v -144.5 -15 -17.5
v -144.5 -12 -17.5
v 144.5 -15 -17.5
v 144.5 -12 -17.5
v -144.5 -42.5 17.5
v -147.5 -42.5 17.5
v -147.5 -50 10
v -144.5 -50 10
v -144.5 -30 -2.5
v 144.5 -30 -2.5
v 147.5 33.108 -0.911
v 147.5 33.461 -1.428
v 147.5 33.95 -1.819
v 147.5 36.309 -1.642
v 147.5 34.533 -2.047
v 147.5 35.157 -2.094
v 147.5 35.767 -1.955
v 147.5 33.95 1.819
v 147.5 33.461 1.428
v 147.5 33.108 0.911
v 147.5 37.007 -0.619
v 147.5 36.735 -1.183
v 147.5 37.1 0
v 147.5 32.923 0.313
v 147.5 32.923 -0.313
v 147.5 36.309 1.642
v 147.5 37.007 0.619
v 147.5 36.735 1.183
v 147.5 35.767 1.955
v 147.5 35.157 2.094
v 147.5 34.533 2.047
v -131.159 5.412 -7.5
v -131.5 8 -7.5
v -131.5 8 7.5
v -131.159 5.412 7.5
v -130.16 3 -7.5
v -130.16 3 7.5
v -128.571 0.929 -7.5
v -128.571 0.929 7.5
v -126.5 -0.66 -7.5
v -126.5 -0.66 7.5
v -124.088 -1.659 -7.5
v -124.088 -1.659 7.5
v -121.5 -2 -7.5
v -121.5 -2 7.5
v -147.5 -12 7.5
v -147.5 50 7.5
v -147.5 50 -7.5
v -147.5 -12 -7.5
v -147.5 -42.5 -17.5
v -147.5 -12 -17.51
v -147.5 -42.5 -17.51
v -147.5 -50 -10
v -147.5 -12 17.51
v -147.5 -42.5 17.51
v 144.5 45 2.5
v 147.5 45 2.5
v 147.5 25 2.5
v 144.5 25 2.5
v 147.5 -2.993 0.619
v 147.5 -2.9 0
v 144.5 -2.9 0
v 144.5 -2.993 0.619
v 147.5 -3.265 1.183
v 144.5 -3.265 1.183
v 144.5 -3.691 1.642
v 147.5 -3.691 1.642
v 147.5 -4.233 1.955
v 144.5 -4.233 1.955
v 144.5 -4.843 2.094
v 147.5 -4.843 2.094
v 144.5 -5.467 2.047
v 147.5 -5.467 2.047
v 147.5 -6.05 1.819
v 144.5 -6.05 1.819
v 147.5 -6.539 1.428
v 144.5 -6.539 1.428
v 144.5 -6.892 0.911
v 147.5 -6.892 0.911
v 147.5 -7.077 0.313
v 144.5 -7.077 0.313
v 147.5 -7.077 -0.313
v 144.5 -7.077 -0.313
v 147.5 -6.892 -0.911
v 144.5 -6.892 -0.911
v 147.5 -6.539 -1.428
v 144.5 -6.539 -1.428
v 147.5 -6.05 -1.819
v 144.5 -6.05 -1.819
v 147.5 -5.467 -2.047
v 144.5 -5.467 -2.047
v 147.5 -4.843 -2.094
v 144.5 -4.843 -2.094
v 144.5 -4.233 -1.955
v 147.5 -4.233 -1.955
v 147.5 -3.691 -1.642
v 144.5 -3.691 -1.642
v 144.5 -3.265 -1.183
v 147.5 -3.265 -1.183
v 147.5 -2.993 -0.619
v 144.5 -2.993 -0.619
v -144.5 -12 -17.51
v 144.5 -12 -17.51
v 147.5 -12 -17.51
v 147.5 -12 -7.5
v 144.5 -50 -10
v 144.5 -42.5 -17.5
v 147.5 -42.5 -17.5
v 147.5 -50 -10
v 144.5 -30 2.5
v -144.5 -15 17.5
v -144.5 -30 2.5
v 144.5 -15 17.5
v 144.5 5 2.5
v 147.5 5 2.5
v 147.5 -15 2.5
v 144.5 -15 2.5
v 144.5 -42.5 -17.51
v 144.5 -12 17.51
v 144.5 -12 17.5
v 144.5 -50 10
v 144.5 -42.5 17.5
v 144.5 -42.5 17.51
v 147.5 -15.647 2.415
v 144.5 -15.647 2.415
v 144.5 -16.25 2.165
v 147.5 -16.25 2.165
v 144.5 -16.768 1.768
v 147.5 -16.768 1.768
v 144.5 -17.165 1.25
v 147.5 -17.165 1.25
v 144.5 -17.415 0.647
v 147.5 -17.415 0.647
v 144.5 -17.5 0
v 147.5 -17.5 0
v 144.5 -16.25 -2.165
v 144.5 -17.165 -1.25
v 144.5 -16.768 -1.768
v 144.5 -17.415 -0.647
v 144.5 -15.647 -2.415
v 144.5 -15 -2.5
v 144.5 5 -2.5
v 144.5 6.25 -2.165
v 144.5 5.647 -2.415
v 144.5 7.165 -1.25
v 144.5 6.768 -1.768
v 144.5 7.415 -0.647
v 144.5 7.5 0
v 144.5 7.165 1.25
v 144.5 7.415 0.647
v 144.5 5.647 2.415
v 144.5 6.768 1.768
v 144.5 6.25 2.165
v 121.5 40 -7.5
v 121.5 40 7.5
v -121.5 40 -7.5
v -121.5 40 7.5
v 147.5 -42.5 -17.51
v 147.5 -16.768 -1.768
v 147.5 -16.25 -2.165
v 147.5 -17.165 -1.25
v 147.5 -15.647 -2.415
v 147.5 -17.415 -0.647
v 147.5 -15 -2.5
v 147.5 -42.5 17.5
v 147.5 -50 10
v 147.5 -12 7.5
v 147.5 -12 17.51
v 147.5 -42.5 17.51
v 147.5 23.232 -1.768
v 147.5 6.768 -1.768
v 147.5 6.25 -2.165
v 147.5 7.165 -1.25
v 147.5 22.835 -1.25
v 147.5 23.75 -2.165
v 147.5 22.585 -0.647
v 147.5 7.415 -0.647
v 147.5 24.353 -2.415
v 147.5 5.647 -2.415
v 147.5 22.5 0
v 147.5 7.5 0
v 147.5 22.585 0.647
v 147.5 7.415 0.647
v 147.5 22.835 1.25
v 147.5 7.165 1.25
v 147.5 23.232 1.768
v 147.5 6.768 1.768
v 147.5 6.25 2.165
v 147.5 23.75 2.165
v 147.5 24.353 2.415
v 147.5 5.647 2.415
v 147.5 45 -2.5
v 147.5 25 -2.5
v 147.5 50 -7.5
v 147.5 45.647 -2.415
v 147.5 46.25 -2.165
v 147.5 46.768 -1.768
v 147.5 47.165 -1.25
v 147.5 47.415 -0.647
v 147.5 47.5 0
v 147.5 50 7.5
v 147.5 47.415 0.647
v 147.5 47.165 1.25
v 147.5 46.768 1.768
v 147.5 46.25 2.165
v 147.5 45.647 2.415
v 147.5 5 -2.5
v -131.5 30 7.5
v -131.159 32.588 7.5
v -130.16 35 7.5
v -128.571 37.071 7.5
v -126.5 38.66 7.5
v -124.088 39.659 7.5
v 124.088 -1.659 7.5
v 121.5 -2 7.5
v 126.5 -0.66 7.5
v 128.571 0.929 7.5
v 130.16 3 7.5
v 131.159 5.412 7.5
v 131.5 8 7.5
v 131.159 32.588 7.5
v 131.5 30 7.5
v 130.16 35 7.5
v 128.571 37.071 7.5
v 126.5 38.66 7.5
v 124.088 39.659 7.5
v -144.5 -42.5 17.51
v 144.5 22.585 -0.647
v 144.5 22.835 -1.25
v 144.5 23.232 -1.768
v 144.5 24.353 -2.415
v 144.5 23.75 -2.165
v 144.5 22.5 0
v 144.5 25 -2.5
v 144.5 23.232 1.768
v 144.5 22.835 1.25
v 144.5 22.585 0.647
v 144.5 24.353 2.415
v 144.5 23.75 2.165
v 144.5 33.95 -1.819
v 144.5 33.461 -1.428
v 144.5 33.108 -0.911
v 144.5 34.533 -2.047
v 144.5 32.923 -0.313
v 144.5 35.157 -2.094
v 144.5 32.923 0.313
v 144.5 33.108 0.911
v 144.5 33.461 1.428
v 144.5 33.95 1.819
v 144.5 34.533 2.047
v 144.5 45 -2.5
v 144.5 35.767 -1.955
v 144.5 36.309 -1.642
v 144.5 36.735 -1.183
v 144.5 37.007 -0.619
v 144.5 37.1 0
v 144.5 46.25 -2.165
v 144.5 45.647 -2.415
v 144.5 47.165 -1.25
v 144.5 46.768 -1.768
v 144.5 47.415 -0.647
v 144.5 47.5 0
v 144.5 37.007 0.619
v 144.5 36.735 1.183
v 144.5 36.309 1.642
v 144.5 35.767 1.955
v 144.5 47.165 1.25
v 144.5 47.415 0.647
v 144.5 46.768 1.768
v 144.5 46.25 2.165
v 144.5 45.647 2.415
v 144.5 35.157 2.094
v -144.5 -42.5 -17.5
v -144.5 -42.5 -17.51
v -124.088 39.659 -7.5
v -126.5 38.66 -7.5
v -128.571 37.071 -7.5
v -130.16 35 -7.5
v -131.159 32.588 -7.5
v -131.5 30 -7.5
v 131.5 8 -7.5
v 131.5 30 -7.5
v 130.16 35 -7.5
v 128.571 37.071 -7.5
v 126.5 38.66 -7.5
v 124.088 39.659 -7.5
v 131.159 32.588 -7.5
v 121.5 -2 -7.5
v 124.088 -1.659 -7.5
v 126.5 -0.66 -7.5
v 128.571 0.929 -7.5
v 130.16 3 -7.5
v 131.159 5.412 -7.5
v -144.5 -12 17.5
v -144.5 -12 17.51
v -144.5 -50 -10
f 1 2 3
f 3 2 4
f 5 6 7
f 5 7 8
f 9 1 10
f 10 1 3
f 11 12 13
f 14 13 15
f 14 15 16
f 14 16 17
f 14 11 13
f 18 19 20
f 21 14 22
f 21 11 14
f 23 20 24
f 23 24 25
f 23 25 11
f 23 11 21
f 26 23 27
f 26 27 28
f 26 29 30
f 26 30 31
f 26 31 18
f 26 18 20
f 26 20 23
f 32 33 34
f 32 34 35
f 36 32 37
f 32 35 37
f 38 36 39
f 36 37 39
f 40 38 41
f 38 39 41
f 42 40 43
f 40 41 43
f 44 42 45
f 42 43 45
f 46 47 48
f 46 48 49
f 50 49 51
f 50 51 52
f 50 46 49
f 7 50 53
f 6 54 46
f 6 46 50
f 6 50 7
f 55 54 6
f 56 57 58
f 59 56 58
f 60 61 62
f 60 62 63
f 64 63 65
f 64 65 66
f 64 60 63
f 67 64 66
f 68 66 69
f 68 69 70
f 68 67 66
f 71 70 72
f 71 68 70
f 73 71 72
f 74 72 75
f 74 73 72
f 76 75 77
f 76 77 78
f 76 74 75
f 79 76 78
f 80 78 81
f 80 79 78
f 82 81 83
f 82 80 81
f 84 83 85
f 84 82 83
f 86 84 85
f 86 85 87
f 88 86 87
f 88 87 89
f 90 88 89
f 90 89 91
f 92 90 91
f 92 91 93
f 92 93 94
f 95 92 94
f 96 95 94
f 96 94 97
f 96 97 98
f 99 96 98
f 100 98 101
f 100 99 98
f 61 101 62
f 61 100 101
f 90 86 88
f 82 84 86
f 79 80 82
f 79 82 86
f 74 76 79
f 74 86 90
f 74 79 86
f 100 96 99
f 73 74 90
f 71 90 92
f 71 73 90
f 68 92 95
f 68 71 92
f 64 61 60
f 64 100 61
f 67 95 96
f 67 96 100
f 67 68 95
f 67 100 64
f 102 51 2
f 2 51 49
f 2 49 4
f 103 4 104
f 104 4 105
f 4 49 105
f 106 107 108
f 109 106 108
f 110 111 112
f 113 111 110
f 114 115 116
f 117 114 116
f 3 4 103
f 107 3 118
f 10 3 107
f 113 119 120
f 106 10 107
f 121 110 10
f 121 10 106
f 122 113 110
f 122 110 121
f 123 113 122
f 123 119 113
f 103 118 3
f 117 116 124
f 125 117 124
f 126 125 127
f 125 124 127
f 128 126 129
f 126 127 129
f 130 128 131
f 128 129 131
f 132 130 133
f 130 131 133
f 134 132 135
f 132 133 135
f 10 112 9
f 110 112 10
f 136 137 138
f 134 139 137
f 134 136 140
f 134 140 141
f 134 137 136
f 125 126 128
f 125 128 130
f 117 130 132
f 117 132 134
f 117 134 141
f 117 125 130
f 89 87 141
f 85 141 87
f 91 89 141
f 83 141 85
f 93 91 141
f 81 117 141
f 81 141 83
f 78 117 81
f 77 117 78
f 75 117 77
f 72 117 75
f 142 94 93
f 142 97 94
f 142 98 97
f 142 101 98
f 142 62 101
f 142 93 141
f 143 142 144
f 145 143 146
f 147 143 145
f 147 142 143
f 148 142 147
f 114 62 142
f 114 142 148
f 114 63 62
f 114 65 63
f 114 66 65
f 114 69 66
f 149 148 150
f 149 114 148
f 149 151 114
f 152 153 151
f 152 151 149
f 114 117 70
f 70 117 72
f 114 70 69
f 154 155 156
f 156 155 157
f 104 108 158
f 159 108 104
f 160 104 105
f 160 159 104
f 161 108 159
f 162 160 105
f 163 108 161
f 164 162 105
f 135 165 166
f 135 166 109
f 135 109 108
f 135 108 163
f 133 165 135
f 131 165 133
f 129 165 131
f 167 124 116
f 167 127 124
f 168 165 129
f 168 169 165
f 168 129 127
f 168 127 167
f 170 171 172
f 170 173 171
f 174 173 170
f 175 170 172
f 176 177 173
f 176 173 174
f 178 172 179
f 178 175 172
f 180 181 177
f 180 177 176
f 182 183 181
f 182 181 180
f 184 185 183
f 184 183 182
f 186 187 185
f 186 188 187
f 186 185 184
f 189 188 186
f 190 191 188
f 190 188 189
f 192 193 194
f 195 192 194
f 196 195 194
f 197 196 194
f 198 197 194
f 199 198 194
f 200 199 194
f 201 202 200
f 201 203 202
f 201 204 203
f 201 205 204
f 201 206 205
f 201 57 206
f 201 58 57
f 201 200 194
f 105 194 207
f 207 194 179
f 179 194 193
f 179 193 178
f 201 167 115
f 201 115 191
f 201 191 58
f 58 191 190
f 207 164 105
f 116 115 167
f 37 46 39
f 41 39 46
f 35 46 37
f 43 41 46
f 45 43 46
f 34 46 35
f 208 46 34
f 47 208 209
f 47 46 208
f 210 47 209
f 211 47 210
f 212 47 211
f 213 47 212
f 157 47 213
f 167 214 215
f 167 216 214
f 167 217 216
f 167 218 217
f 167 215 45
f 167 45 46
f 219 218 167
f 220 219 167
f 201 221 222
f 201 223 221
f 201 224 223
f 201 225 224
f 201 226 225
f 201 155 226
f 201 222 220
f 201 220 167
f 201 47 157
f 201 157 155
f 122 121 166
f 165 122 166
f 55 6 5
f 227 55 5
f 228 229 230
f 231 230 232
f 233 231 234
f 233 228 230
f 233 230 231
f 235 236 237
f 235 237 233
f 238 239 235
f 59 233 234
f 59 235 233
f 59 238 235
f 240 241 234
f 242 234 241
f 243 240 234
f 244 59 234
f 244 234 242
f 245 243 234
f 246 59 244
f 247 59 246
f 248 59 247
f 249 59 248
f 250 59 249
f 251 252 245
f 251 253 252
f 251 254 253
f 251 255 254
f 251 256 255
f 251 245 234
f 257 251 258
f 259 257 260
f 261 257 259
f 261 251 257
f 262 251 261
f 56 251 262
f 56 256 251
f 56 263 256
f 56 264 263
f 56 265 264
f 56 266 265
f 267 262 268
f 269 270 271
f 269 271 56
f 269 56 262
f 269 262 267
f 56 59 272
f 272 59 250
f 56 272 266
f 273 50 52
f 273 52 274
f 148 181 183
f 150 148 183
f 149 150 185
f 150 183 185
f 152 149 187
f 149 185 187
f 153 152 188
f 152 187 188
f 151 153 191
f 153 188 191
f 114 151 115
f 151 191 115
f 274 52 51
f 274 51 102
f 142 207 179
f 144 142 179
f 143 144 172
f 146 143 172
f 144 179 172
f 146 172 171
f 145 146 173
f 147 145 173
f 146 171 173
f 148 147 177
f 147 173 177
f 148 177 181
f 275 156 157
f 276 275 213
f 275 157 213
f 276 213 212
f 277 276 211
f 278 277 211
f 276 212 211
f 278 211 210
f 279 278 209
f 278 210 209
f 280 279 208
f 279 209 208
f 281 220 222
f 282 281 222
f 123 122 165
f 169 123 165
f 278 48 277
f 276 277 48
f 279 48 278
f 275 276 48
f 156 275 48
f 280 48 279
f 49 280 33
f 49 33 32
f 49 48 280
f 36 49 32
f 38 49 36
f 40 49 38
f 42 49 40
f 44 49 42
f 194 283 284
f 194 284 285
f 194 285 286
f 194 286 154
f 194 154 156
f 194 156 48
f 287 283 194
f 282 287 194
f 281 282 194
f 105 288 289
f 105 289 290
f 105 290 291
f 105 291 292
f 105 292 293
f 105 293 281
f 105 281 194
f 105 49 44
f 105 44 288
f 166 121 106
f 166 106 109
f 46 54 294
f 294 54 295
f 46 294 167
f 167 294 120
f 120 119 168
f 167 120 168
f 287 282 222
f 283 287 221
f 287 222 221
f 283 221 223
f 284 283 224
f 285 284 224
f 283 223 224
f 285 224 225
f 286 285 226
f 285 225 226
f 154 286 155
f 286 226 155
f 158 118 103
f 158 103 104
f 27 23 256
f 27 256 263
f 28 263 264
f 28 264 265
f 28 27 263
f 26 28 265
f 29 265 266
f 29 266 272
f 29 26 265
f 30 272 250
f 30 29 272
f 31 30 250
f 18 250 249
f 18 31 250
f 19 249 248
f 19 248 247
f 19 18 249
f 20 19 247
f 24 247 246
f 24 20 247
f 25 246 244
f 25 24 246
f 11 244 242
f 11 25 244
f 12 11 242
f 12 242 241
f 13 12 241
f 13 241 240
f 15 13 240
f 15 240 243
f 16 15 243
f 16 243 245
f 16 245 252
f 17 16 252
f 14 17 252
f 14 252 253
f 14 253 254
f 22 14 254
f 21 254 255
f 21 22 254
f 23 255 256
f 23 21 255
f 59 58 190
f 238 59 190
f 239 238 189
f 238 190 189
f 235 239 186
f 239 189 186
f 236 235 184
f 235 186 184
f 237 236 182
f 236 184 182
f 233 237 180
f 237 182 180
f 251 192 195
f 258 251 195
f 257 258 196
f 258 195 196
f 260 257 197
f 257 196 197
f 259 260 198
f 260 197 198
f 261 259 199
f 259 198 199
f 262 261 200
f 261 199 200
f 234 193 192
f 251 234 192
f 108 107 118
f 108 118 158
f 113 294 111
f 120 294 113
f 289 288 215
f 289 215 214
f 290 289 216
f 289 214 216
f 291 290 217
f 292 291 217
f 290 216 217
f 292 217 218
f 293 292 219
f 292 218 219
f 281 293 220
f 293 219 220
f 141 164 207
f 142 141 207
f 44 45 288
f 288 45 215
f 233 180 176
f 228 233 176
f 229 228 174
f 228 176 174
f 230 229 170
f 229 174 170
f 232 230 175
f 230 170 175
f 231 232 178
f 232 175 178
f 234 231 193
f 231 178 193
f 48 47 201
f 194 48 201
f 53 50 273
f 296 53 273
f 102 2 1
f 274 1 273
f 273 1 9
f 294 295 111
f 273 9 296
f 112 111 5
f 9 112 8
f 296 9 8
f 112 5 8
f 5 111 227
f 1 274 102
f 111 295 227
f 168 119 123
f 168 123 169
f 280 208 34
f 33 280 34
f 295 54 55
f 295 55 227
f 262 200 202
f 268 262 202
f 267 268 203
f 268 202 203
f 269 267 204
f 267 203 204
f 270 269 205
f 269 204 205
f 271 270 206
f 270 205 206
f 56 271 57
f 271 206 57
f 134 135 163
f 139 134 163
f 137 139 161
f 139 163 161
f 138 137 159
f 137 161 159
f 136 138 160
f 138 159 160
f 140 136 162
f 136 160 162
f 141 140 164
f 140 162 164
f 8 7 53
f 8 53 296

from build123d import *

# Parameters (mm, degrees)
F1_DEPTH       = 17.5
F1_DEPTH_BACK  = 17.5
F2_SIZE        = 15
F3_SIZE        = 7.5
F5_W           = 3
F5_H           = 92.5
F6_DEPTH       = 0.01
F7_W           = 3
F7_H           = 92.5
F8_DEPTH       = 0.01
F4_R           = 2.1
F9_DEPTH       = 3
F11_DEPTH      = 10
F13_DEPTH      = 10
F15_DEPTH      = 25
F16_W          = 295
F16_H          = 62
F17_DEPTH      = 10
F17_DEPTH_BACK = 25
F18_W          = 295
F18_H          = 62
F19_DEPTH      = 10
F19_DEPTH_BACK = 25


with BuildPart() as f1:
    # F0 (on Top) → F1 (new body, two sides)
    with BuildSketch(Plane.XY) as f1_sk:
        Polygon((147.5, -50), (147.5, 50), (-147.5, 50), (-147.5, -50), (-144.5, -50), (-144.5, -30), (144.5, -30), (144.5, -50), align=None)
    extrude(amount=F1_DEPTH)
    extrude(f1_sk.sketch, amount=-F1_DEPTH_BACK)

    # F2
    f2_edges = [f1.edges().sort_by_distance(p)[0] for p in [
        (0, -30, 17.5),
        (0, -30, -17.5),
    ]]
    chamfer(f2_edges, length=F2_SIZE)

    # F3
    f3_edges = [f1.edges().sort_by_distance(p)[0] for p in [
        (146, -50, 17.5),
        (146, -50, -17.5),
        (-146, -50, 17.5),
        (-146, -50, -17.5),
    ]]
    chamfer(f3_edges, length=F3_SIZE)

    # F5 (on face) → F6 (join)
    with BuildSketch(Plane.XY.offset(17.5)):
        with Locations((-146, 3.75)):
            Rectangle(F5_W, F5_H)
        with Locations((146, 3.75)):
            Rectangle(F5_W, F5_H)
    extrude(amount=F6_DEPTH)

    # F7 (on face) → F8 (join)
    with BuildSketch(Plane(origin=(0, 0, -17.5), x_dir=(1, 0, 0), z_dir=(0, 0, -1))):
        with Locations((-146, -3.75)):
            Rectangle(F7_W, F7_H)
        with Locations((146, -3.75)):
            Rectangle(F7_W, F7_H)
    extrude(amount=F8_DEPTH)

    # F4 (on face) → F9 (cut)
    with BuildSketch(Plane.YZ.offset(147.5)):
        with BuildLine():
            ThreePointArc((47.5, 0), (46.767766953, 1.767766953), (45, 2.5))
            Line((45, 2.5), (25, 2.5))
            ThreePointArc((25, 2.5), (23.232233047, 1.767766953), (22.5, 0))
            ThreePointArc((22.5, 0), (23.232233047, -1.767766953), (25, -2.5))
            Line((25, -2.5), (45, -2.5))
            ThreePointArc((45, -2.5), (46.767766953, -1.767766953), (47.5, 0))
        make_face()
        with Locations((35, 0)):
            Circle(F4_R, mode=Mode.SUBTRACT)
        with BuildLine():
            ThreePointArc((7.5, 0), (6.767766953, 1.767766953), (5, 2.5))
            Line((5, 2.5), (-15, 2.5))
            ThreePointArc((-15, 2.5), (-16.767766953, 1.767766953), (-17.5, 0))
            ThreePointArc((-17.5, 0), (-16.767766953, -1.767766953), (-15, -2.5))
            Line((-15, -2.5), (5, -2.5))
            ThreePointArc((5, -2.5), (6.767766953, -1.767766953), (7.5, 0))
        make_face()
        with Locations((-5, 0)):
            Circle(F4_R, mode=Mode.SUBTRACT)
    extrude(amount=-F9_DEPTH, mode=Mode.SUBTRACT)

    # F10 (on face) → F11 (cut)
    with BuildSketch(Plane.XY.offset(17.5)):
        with BuildLine():
            Line((141.5, 50), (-141.5, 50))
            Line((-141.5, 50), (-141.5, -2))
            ThreePointArc((-141.5, -2), (-138.5710678119, -9.0710678119), (-131.5, -12))
            Line((-131.5, -12), (131.5, -12))
            ThreePointArc((131.5, -12), (138.5710678119, -9.0710678119), (141.5, -2))
            Line((141.5, -2), (141.5, 50))
        make_face()
    extrude(amount=-F11_DEPTH, mode=Mode.SUBTRACT)

    # F12 (on face) → F13 (cut)
    with BuildSketch(Plane(origin=(0, 0, -17.5), x_dir=(1, 0, 0), z_dir=(0, 0, -1))):
        with BuildLine():
            Line((141.5, -50), (141.5, 2))
            ThreePointArc((141.5, 2), (138.5710678119, 9.0710678119), (131.5, 12))
            Line((131.5, 12), (-131.5, 12))
            ThreePointArc((-131.5, 12), (-138.5710678119, 9.0710678119), (-141.5, 2))
            Line((-141.5, 2), (-141.5, -50))
            Line((-141.5, -50), (141.5, -50))
        make_face()
    extrude(amount=-F13_DEPTH, mode=Mode.SUBTRACT)

    # F14 (on face) → F15 (cut)
    with BuildSketch(Plane.XY.offset(7.5)):
        with BuildLine():
            Line((121.5, 40), (-121.5, 40))
            ThreePointArc((-121.5, 40), (-128.5710678119, 37.0710678119), (-131.5, 30))
            Line((-131.5, 30), (-131.5, 8))
            ThreePointArc((-131.5, 8), (-128.5710678119, 0.9289321881), (-121.5, -2))
            Line((-121.5, -2), (121.5, -2))
            ThreePointArc((121.5, -2), (128.5710678119, 0.9289321881), (131.5, 8))
            Line((131.5, 8), (131.5, 30))
            ThreePointArc((131.5, 30), (128.5710678119, 37.0710678119), (121.5, 40))
        make_face()
    extrude(amount=-F15_DEPTH, mode=Mode.SUBTRACT)

    # F16 (on face) → F17 (cut, two sides)
    with BuildSketch(Plane.XY.offset(17.5)) as f17_sk:
        with Locations((0, 19)):
            Rectangle(F16_W, F16_H)
    extrude(amount=-F17_DEPTH, mode=Mode.SUBTRACT)
    extrude(f17_sk.sketch, amount=F17_DEPTH_BACK, mode=Mode.SUBTRACT)

    # F18 (on face) → F19 (cut, two sides)
    with BuildSketch(Plane(origin=(0, 0, -17.5), x_dir=(1, 0, 0), z_dir=(0, 0, -1))) as f19_sk:
        with Locations((0, -19)):
            Rectangle(F18_W, F18_H)
    extrude(amount=-F19_DEPTH, mode=Mode.SUBTRACT)
    extrude(f19_sk.sketch, amount=F19_DEPTH_BACK, mode=Mode.SUBTRACT)


solid = f1.part
